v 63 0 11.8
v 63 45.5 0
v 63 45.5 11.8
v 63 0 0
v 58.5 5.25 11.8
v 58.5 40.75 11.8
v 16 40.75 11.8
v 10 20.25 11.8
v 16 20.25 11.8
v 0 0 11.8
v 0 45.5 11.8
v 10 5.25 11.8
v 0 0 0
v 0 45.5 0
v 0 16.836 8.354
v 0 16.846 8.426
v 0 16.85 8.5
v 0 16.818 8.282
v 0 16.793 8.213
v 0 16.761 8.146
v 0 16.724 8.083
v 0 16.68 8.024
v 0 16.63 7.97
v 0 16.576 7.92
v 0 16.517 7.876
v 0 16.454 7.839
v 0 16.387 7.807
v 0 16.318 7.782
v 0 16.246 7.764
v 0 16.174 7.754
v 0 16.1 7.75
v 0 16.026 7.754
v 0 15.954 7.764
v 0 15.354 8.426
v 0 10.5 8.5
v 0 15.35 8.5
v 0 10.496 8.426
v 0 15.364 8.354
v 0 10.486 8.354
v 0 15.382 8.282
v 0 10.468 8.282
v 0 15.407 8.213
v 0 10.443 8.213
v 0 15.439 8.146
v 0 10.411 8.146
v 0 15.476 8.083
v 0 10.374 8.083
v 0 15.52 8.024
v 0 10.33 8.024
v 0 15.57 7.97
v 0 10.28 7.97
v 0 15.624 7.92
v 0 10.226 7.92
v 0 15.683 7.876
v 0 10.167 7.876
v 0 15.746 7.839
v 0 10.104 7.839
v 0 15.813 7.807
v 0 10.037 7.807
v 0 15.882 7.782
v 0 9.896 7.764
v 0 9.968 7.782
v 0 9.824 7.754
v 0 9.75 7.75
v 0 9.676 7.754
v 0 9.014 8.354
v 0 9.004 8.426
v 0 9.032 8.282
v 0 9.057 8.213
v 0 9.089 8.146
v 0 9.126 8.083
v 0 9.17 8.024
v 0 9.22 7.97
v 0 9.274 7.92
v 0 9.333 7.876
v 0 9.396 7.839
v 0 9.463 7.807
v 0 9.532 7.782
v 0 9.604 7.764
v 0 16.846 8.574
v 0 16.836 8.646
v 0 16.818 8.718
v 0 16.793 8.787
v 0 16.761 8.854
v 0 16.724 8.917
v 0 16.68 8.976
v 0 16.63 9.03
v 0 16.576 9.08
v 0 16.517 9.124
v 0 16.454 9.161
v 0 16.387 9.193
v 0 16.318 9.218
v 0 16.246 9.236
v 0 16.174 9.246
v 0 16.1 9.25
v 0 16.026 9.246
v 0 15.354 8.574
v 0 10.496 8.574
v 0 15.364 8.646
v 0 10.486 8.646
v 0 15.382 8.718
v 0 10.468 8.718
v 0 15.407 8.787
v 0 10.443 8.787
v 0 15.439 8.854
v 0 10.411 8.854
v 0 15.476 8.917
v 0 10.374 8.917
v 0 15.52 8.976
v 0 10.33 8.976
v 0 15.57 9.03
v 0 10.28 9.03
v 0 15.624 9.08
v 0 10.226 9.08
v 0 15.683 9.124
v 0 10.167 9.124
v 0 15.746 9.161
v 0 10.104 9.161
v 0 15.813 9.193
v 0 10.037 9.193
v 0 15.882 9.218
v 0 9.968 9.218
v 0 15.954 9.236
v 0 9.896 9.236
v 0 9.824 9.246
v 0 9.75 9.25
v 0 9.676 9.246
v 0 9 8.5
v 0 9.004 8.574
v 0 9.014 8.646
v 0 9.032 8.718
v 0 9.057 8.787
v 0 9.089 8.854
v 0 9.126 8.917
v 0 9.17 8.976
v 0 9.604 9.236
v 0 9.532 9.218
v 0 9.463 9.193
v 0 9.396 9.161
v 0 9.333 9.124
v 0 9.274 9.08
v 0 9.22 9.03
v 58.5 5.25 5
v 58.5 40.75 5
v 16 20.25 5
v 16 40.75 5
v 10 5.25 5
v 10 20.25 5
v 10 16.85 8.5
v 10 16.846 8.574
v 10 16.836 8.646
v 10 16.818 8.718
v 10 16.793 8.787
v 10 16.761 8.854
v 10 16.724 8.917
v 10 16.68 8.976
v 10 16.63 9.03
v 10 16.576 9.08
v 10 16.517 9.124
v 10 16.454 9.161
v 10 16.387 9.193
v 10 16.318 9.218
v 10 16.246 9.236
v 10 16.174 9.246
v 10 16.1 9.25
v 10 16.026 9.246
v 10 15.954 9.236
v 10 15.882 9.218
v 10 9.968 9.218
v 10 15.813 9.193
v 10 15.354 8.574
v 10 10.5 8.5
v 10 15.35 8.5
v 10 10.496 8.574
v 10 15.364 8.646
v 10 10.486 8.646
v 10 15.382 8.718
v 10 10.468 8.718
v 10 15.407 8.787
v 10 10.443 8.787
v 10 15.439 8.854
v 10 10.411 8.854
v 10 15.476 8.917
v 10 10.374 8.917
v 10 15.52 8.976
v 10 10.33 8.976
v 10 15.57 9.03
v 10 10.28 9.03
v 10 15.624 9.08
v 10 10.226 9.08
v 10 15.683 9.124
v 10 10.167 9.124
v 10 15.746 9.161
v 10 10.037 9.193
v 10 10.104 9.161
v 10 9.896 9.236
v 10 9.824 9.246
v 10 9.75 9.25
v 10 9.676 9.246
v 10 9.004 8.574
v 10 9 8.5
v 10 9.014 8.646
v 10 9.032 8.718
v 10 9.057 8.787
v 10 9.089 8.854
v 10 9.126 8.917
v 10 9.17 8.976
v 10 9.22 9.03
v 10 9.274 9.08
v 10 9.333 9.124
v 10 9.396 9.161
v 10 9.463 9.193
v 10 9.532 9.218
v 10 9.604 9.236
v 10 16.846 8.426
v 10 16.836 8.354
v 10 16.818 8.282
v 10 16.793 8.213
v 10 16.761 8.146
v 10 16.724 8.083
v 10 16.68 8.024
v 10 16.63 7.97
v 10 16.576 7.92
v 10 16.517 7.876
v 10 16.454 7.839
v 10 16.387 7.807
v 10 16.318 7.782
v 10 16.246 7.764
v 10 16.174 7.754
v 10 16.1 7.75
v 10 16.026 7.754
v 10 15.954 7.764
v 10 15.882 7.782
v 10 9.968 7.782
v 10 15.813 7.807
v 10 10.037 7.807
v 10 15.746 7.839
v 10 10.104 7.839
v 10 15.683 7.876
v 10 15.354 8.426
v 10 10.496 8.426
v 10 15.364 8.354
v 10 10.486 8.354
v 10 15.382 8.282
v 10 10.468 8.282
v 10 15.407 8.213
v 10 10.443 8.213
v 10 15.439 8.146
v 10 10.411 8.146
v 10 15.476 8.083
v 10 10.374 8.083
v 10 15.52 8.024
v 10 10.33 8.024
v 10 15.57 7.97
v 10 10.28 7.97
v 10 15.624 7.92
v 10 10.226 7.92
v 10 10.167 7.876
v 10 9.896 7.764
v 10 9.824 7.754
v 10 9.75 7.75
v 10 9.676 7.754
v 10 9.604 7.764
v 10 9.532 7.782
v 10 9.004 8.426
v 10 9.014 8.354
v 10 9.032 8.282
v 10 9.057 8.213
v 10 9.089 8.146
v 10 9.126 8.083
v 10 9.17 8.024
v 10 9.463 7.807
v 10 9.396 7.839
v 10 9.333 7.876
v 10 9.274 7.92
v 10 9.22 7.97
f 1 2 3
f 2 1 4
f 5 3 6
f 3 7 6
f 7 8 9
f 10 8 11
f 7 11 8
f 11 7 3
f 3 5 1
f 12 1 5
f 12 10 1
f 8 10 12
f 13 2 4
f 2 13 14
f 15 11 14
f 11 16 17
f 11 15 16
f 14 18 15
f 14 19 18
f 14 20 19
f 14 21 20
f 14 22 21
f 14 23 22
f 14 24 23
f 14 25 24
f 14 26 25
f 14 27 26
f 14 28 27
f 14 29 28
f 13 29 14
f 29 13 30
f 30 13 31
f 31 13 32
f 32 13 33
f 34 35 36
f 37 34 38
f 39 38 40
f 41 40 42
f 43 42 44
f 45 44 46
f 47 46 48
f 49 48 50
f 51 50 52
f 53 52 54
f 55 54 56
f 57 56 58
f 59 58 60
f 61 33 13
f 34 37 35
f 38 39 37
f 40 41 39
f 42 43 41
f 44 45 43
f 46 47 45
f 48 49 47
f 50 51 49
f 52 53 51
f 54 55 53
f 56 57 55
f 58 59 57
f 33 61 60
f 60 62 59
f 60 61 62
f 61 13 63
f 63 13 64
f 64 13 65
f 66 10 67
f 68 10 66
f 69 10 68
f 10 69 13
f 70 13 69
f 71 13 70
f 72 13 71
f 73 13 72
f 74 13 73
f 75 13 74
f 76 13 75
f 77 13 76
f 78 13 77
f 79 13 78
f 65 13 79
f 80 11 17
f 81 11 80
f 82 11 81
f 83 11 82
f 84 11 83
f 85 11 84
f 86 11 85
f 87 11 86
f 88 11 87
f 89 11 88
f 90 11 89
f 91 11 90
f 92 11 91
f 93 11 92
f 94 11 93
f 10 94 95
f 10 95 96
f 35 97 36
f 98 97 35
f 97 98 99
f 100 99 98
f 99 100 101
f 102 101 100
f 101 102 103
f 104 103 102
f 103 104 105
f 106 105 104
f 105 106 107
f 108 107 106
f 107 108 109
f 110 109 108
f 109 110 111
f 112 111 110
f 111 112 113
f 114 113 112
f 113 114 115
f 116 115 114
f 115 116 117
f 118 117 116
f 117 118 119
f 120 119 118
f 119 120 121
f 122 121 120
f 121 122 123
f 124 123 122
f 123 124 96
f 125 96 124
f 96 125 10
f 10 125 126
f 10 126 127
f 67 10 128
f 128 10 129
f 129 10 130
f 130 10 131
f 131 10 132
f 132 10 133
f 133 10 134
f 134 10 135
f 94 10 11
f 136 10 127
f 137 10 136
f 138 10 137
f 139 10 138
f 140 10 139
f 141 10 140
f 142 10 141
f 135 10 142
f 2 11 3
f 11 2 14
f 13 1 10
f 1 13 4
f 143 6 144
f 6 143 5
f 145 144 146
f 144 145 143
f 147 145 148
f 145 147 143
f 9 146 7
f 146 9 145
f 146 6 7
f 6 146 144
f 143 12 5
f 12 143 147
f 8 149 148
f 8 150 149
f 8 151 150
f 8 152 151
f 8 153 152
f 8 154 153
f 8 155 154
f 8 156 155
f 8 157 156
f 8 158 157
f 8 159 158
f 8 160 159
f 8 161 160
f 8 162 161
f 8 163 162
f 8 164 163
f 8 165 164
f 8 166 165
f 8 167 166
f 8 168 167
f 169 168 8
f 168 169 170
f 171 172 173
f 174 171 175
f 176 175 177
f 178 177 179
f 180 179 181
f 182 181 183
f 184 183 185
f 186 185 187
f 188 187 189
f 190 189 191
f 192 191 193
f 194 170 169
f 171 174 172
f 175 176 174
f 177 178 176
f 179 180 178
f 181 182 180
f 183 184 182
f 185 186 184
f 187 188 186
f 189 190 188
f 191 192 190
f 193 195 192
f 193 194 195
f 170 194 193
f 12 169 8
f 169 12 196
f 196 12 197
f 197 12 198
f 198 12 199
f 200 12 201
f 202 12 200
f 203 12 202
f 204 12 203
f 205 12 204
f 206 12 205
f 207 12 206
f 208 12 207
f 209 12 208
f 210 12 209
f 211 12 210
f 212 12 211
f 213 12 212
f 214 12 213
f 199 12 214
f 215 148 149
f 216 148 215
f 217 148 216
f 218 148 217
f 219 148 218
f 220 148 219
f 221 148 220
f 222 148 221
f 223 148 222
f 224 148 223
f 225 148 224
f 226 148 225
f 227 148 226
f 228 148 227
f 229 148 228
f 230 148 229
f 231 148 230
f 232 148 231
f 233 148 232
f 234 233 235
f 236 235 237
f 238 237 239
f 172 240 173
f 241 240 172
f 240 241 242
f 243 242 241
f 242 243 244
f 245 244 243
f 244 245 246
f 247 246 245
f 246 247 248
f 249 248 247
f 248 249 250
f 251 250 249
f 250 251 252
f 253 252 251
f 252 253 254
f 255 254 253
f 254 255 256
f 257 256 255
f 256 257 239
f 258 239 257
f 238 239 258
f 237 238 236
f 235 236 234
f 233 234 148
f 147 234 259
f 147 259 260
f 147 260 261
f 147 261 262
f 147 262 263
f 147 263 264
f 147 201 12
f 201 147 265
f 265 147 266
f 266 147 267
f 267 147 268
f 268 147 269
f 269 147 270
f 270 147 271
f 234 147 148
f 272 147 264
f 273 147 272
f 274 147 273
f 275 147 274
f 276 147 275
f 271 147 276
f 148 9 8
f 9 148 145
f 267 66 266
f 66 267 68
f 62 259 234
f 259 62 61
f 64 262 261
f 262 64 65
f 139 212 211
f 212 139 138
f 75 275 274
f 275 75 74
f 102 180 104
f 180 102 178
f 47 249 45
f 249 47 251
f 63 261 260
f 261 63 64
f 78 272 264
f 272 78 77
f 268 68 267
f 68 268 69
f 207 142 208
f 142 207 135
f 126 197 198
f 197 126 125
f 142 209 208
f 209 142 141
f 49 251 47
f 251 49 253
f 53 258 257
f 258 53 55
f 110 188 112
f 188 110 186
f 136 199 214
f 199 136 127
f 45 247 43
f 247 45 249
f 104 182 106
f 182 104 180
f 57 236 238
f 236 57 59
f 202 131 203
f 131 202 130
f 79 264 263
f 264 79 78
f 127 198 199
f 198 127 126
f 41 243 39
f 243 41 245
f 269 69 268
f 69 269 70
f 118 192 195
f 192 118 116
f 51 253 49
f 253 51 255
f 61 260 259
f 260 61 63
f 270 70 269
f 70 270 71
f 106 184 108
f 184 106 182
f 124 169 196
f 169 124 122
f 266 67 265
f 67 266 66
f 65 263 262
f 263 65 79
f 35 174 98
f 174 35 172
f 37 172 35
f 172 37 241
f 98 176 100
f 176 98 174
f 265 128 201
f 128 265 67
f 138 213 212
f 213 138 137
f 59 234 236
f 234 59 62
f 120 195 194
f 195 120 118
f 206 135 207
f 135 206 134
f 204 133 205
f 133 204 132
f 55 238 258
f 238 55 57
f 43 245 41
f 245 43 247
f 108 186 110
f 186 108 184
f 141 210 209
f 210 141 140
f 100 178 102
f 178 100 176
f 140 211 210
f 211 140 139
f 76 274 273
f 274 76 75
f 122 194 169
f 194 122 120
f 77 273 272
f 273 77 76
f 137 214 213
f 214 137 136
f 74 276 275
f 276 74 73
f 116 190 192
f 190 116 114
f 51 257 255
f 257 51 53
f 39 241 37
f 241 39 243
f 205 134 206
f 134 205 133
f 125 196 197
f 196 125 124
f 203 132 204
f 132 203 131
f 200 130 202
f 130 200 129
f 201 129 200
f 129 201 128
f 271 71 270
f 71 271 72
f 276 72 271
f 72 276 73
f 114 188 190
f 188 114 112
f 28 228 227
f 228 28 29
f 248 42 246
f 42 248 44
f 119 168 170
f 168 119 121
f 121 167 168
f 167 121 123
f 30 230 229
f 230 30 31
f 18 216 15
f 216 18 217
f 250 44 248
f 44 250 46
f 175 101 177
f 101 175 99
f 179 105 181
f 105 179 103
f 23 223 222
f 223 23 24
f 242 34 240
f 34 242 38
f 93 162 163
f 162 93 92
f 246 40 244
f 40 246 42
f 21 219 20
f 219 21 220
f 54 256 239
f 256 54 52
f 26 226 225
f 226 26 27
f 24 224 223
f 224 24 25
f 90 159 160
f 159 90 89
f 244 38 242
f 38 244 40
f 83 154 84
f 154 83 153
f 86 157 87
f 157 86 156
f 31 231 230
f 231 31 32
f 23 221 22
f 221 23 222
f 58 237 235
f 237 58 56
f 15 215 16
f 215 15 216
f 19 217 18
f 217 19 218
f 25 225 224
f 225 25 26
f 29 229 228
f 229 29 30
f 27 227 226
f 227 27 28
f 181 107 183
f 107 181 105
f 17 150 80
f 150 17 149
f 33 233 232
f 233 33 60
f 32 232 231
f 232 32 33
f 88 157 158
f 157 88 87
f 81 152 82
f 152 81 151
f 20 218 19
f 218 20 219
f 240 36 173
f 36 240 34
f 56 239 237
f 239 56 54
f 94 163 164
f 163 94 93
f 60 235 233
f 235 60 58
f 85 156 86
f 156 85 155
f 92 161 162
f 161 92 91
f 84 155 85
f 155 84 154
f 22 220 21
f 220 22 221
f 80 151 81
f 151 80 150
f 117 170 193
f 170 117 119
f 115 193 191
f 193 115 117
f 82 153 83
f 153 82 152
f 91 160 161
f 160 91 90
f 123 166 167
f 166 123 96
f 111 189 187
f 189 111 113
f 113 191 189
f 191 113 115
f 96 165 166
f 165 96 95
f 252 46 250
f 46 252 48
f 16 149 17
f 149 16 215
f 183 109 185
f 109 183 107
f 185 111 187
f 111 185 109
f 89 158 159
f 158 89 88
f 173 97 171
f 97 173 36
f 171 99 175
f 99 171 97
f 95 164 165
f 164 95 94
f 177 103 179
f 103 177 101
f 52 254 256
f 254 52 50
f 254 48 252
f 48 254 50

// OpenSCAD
/* [Battery Size] */

Battery_Length = 42;
Battery_Width = 35;
Battery_Height = 7;

Battery_Slop = 0.5;

/* [Contact Positioning] */

Contact_Height = 3.5; // [1:0.1:10]
Contact1_Offset = 4.75;
Contact2_Offset = 11.1;
Contact_Cutout = 15;

/* [Additional Details] */

Wall = 5;
Spring_Travel = 6;
Spring_Diameter = 1.5;
Cradle_Height_Ratio = 0.9; // [0:0.1:1]

/* [Hidden] */

$fn = 64;

difference() {
    cube([Battery_Length + 3 * Wall + Spring_Travel, Battery_Width + 2 * Wall + Battery_Slop, Wall + Cradle_Height_Ratio * Battery_Height + Battery_Slop]);
    translate([2 * Wall + Spring_Travel, Wall + Battery_Slop/2, Wall]) 
        cube([Battery_Length + Battery_Slop, Battery_Width + Battery_Slop, Battery_Height + Battery_Slop]);
    translate([Wall * 2, Wall + Battery_Slop/2, Wall])
        cube([Spring_Travel, Contact_Cutout, Battery_Height + Battery_Slop]); 
    translate([-Wall, Wall + Contact1_Offset, Wall + Contact_Height])
        rotate([0, 90, 0])
            cylinder(d = Spring_Diameter, h = 6 * Wall);
    translate([-Wall, Wall + Contact2_Offset, Wall + Contact_Height])
        rotate([0, 90, 0])
            cylinder(d = Spring_Diameter, h = 6 * Wall);               
}

 
